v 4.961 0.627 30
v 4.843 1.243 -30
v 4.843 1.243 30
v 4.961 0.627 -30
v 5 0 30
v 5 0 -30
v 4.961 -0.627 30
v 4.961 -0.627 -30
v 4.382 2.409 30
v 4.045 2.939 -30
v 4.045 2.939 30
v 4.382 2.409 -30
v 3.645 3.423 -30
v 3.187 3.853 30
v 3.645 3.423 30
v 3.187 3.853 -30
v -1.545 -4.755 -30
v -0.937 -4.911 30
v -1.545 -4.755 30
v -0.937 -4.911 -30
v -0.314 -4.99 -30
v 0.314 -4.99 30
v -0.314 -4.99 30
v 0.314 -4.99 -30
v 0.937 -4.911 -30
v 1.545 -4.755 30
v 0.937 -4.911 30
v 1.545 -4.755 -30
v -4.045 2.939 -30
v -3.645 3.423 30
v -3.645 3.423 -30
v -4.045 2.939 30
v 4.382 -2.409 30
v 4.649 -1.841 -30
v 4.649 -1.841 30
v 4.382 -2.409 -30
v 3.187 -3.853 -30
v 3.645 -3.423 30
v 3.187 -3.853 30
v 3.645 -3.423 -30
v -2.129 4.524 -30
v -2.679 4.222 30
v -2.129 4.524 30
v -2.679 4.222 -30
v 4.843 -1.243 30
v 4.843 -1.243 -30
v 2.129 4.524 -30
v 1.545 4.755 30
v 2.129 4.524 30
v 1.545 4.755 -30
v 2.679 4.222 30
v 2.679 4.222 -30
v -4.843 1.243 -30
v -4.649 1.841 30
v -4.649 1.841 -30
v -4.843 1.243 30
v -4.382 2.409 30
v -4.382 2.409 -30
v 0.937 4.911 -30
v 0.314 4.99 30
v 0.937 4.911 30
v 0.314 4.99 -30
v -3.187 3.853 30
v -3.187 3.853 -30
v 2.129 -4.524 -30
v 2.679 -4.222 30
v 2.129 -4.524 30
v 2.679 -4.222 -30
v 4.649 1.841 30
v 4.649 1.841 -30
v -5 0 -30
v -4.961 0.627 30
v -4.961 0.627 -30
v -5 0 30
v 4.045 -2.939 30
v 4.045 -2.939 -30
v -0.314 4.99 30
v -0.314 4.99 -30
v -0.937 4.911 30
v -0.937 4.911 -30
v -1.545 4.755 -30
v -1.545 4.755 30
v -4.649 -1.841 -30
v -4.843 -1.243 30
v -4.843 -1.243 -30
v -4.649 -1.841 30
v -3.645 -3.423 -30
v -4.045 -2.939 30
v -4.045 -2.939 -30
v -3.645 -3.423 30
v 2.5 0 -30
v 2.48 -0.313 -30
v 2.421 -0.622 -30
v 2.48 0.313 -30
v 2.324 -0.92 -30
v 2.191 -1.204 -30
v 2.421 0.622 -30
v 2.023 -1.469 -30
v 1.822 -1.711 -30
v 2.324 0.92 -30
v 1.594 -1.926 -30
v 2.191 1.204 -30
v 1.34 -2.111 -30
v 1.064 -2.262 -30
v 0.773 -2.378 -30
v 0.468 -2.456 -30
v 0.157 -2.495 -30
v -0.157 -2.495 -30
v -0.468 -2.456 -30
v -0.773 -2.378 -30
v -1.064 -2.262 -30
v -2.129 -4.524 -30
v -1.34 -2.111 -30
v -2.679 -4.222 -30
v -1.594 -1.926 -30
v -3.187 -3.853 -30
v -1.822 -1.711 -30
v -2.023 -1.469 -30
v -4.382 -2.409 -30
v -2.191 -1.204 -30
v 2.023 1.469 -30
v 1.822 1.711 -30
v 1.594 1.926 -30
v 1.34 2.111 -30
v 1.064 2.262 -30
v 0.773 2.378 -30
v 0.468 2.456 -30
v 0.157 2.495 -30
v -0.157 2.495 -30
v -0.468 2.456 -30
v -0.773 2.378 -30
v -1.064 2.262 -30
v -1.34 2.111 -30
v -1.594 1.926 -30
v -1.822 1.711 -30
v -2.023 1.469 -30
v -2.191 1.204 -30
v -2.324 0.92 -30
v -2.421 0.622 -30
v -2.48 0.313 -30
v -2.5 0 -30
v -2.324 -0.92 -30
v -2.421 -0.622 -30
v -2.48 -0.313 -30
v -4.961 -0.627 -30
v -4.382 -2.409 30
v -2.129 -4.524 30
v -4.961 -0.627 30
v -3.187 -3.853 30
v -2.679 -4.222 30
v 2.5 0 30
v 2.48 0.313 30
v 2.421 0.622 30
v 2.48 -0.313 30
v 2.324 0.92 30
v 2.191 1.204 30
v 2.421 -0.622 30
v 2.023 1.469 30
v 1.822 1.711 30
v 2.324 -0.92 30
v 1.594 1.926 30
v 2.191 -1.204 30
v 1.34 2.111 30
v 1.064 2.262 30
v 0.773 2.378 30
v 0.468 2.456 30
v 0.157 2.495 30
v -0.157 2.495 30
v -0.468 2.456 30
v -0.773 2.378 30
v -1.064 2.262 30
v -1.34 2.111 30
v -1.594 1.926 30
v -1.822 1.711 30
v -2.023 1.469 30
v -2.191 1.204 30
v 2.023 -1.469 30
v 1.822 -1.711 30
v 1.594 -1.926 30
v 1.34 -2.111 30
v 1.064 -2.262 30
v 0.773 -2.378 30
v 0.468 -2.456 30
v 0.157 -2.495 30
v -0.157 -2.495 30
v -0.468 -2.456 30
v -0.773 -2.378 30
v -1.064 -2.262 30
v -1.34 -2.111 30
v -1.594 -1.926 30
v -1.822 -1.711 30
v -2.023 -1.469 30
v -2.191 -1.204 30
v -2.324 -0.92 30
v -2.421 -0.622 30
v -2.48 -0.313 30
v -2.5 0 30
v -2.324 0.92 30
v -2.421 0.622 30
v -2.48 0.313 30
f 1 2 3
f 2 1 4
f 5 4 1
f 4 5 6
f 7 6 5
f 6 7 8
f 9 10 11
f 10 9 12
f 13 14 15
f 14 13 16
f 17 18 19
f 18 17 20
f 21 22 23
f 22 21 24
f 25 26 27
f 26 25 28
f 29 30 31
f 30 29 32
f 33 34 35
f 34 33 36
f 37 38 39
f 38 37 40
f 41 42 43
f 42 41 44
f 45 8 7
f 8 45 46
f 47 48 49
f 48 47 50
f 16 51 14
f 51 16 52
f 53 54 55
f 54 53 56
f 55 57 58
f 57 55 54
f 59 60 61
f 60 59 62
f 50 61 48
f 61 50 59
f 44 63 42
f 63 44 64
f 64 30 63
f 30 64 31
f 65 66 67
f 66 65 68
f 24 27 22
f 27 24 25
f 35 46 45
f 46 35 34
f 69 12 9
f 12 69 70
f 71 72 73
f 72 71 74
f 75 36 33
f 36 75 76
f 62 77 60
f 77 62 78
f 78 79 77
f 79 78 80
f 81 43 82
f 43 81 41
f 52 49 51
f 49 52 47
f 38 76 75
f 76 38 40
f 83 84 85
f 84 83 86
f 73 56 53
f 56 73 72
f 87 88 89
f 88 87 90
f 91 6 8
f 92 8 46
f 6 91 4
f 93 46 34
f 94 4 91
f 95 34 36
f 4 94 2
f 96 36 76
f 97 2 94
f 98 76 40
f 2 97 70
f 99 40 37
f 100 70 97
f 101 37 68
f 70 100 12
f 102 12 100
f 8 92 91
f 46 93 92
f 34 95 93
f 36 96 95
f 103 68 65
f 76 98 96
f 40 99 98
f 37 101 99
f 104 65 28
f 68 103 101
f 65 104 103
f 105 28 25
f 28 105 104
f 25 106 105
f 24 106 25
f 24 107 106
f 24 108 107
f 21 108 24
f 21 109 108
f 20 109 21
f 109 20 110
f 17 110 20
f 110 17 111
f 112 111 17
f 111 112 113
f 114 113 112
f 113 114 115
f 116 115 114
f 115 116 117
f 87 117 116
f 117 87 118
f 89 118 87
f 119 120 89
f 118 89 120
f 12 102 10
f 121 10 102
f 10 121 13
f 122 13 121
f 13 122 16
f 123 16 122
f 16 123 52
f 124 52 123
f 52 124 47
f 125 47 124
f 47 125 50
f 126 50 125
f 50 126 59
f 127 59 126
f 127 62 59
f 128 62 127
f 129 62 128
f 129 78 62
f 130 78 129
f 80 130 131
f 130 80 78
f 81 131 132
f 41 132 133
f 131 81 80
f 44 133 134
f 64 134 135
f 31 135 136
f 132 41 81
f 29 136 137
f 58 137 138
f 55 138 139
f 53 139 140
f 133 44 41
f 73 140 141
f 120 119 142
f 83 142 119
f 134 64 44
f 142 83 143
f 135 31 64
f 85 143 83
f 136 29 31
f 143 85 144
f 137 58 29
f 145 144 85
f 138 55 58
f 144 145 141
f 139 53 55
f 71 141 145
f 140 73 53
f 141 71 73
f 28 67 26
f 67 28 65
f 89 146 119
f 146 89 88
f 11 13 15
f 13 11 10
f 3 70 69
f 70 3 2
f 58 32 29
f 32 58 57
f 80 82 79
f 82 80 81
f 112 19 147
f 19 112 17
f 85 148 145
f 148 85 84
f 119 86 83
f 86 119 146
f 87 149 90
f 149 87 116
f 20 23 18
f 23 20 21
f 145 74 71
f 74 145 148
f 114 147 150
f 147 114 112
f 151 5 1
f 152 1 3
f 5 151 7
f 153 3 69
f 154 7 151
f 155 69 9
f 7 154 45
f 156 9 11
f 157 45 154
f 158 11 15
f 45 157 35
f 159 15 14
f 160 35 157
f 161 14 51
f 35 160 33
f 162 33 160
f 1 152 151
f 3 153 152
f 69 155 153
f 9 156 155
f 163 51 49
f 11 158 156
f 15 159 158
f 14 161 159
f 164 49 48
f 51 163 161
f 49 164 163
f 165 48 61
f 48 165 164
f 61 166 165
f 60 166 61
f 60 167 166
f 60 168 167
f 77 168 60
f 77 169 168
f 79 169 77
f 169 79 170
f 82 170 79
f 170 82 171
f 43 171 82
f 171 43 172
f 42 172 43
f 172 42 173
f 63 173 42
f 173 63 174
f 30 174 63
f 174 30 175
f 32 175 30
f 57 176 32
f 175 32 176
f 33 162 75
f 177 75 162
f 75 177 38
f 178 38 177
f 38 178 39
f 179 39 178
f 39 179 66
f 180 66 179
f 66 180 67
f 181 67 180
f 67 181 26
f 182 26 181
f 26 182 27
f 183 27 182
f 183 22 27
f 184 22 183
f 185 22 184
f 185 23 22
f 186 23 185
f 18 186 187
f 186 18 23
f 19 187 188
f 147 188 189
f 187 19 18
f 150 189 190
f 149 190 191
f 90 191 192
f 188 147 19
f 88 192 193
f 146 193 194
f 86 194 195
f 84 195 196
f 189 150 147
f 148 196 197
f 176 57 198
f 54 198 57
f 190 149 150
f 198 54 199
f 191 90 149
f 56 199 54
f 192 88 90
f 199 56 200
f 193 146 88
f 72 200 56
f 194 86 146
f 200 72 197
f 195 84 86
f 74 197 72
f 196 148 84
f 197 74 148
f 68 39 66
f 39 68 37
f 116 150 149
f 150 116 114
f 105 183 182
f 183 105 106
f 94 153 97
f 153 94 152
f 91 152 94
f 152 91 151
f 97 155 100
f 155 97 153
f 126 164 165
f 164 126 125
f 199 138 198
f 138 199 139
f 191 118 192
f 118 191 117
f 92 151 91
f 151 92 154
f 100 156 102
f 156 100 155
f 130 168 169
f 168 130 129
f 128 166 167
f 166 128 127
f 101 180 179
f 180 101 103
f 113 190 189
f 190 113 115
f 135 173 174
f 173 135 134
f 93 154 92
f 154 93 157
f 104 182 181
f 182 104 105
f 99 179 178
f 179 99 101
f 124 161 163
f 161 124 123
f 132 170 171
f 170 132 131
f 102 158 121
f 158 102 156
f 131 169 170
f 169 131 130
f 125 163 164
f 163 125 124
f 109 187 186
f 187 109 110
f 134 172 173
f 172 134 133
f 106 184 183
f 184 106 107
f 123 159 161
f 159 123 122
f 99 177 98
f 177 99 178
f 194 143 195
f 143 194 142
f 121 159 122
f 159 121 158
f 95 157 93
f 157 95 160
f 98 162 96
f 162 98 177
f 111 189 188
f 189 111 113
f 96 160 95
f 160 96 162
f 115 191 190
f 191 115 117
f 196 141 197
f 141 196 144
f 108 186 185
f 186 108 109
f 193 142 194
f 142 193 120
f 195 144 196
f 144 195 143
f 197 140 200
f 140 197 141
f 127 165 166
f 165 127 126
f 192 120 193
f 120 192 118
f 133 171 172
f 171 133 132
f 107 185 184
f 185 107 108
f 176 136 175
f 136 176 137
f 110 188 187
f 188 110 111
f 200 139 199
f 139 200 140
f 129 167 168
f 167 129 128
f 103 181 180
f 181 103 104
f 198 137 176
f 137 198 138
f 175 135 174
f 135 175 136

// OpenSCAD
$fn = 50;


difference() {
	union() {
		translate(v = [0, 0, -30.0000000000]) {
			cylinder(h = 60, r = 5.0000000000);
		}
	}
	union() {
		translate(v = [0, 0, -100.0000000000]) {
			cylinder(h = 200, r = 2.5000000000);
		}
	}
}
